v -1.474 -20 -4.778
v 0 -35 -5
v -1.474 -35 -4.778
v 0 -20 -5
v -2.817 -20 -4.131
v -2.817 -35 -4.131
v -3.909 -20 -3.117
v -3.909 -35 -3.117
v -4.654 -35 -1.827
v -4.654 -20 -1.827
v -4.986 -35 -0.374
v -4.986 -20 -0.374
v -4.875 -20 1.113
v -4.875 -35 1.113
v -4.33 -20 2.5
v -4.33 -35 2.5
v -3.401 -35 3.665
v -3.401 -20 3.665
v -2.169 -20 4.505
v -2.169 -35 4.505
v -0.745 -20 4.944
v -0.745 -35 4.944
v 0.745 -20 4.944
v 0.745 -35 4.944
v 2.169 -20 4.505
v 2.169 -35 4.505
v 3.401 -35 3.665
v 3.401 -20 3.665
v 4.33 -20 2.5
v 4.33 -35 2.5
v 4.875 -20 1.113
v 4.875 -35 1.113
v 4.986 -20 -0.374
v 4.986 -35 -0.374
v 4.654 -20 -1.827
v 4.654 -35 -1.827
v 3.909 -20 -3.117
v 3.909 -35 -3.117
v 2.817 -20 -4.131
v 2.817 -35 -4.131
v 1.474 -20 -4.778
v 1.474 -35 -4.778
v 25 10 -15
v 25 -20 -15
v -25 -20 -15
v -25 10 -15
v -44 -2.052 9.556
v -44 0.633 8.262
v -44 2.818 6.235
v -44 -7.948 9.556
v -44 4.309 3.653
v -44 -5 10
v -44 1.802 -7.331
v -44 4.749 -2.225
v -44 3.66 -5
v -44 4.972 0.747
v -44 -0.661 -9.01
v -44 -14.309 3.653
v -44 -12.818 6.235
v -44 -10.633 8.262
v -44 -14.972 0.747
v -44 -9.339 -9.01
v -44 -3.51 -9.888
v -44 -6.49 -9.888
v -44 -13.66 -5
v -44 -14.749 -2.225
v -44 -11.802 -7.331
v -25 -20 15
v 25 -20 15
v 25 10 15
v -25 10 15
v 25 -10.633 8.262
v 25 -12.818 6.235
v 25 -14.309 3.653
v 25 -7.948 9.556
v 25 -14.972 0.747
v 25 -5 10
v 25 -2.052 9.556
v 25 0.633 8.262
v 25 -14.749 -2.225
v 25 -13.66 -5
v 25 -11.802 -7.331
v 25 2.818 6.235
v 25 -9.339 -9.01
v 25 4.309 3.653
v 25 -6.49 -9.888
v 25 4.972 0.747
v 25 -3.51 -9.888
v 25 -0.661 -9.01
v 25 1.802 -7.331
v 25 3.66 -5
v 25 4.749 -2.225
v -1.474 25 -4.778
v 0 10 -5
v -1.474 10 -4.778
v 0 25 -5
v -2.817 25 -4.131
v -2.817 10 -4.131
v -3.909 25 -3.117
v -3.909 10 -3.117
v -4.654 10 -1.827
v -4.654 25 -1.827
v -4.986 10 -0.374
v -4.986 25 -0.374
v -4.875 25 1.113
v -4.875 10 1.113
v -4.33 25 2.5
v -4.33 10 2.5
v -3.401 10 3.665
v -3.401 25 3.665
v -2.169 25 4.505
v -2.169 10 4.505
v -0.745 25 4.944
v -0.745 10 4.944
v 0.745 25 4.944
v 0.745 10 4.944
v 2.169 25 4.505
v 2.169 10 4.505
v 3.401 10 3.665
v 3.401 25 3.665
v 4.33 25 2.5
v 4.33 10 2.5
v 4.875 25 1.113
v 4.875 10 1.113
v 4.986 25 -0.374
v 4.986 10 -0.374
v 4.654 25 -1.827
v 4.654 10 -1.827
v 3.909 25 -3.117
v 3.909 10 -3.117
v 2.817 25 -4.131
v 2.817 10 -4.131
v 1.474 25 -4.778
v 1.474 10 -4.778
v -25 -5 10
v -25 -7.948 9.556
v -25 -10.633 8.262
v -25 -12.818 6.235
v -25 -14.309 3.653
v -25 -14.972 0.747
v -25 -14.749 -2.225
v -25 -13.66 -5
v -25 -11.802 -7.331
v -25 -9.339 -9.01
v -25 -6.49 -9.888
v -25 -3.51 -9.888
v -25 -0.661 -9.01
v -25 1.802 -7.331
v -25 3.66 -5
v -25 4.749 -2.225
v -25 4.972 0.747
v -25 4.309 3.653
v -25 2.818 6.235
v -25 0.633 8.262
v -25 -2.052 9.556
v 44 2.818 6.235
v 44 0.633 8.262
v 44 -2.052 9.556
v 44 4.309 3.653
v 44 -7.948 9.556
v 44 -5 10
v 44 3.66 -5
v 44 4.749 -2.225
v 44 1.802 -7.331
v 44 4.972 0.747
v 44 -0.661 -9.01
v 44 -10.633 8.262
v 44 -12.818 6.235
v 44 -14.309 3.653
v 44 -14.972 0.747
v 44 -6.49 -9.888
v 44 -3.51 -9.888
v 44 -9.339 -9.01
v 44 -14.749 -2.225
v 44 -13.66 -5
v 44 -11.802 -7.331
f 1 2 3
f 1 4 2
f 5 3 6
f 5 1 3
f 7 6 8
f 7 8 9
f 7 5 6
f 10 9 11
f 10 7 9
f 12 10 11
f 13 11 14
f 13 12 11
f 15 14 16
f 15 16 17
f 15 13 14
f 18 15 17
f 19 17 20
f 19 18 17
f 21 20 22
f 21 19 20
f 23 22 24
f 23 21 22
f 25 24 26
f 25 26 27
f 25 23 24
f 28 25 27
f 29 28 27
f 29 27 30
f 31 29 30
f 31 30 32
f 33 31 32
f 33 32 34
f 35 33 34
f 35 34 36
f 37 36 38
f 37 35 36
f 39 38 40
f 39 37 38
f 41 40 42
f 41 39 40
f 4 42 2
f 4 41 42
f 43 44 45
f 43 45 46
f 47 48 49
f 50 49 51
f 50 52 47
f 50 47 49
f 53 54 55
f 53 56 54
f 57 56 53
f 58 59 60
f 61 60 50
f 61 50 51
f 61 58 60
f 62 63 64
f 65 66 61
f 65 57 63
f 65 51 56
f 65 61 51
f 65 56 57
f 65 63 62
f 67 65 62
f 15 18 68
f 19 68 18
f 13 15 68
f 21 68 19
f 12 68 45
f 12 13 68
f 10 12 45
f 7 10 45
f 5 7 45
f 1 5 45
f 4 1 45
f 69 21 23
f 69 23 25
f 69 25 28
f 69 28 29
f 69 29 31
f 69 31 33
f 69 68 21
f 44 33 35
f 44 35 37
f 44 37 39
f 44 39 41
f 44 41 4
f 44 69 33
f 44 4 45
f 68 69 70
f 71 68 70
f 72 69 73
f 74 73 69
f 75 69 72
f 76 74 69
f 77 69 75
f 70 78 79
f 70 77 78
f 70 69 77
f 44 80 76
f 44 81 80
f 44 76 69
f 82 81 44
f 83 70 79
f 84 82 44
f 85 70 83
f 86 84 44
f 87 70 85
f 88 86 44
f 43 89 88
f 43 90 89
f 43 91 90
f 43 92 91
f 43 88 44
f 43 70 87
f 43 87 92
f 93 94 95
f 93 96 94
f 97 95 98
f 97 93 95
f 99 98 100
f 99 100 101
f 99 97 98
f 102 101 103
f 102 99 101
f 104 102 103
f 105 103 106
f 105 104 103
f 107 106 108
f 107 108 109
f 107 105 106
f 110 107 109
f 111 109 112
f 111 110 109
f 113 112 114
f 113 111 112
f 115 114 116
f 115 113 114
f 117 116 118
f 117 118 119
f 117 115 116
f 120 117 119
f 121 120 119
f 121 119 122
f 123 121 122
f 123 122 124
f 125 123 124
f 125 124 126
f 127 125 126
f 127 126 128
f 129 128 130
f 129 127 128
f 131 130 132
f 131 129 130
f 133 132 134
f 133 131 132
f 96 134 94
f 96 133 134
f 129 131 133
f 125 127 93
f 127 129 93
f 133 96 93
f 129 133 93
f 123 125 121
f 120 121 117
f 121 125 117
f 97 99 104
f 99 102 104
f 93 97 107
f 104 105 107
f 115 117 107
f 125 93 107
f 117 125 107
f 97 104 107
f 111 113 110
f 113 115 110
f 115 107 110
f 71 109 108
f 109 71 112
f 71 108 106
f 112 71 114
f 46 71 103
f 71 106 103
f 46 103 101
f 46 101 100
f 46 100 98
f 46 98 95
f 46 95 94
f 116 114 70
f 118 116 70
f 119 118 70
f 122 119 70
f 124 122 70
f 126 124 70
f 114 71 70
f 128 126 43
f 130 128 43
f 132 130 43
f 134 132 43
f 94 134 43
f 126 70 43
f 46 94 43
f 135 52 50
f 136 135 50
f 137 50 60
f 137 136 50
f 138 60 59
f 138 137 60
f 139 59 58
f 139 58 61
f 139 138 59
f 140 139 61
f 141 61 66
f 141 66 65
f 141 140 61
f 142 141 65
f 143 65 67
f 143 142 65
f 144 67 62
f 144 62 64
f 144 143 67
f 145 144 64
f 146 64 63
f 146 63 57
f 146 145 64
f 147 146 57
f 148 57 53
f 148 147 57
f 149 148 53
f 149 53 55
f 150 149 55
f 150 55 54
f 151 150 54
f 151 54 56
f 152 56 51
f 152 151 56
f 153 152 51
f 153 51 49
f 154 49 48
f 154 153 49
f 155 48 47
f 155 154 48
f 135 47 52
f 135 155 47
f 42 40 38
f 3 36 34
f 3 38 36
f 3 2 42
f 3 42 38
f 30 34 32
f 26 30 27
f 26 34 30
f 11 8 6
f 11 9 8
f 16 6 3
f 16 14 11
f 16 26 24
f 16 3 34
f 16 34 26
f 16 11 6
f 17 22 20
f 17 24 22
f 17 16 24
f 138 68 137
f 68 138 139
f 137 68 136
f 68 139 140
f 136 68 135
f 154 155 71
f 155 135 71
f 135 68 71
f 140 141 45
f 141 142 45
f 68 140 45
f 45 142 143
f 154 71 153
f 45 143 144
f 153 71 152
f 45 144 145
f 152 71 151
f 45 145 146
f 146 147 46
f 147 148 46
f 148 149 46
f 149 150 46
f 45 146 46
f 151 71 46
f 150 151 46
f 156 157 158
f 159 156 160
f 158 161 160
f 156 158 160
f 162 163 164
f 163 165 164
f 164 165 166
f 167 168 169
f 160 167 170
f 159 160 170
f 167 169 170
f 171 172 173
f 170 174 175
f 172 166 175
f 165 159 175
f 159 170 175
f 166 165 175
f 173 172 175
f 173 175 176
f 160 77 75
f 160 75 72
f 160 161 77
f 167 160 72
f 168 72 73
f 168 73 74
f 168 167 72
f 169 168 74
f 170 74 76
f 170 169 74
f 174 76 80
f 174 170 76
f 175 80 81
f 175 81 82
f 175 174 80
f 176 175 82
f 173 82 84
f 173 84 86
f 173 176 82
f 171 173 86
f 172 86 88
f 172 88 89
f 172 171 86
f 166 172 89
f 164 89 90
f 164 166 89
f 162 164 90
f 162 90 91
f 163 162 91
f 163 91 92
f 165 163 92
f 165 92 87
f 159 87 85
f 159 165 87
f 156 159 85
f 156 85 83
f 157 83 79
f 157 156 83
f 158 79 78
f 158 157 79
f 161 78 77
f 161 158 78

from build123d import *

# Parameters (mm, degrees)
SKETCH_1_W      = 88
SKETCH_1_H      = 10
SKETCH_3_W      = 5
SKETCH_3_H      = 60
SKETCH_4_W      = 30
SKETCH_4_H      = 30
EXTRUDE_1_DEPTH = 25


with BuildPart() as part:
    # 草图1 → 旋转1 (revolve)
    with BuildSketch(Plane.XY, mode=Mode.PRIVATE) as revolve_1_sk:
        Rectangle(SKETCH_1_W, SKETCH_1_H)
    revolve(revolve_1_sk.sketch.rotate(Axis((-44, -5, 0), (1, 0, 0)), 90), axis=Axis((-44, -5, 0), (1, 0, 0)))

    # 草图3 → 旋转2 (revolve)
    with BuildSketch(Plane.XY, mode=Mode.PRIVATE) as revolve_2_sk:
        with Locations((2.5, -5)):
            Rectangle(SKETCH_3_W, SKETCH_3_H)
    revolve(revolve_2_sk.sketch.rotate(Axis((0, -35, 0), (0, 1, 0)), 90), axis=Axis((0, -35, 0), (0, 1, 0)))

    # 草图4 → 凸台-拉伸1 (add, symmetric)
    with BuildSketch(Plane(origin=(0, 0, 0), x_dir=(0, 0, -1), z_dir=(1, 0, 0))):
        with Locations((0, -5)):
            Rectangle(SKETCH_4_W, SKETCH_4_H)
    extrude(amount=EXTRUDE_1_DEPTH, both=True)


solid = part.part
